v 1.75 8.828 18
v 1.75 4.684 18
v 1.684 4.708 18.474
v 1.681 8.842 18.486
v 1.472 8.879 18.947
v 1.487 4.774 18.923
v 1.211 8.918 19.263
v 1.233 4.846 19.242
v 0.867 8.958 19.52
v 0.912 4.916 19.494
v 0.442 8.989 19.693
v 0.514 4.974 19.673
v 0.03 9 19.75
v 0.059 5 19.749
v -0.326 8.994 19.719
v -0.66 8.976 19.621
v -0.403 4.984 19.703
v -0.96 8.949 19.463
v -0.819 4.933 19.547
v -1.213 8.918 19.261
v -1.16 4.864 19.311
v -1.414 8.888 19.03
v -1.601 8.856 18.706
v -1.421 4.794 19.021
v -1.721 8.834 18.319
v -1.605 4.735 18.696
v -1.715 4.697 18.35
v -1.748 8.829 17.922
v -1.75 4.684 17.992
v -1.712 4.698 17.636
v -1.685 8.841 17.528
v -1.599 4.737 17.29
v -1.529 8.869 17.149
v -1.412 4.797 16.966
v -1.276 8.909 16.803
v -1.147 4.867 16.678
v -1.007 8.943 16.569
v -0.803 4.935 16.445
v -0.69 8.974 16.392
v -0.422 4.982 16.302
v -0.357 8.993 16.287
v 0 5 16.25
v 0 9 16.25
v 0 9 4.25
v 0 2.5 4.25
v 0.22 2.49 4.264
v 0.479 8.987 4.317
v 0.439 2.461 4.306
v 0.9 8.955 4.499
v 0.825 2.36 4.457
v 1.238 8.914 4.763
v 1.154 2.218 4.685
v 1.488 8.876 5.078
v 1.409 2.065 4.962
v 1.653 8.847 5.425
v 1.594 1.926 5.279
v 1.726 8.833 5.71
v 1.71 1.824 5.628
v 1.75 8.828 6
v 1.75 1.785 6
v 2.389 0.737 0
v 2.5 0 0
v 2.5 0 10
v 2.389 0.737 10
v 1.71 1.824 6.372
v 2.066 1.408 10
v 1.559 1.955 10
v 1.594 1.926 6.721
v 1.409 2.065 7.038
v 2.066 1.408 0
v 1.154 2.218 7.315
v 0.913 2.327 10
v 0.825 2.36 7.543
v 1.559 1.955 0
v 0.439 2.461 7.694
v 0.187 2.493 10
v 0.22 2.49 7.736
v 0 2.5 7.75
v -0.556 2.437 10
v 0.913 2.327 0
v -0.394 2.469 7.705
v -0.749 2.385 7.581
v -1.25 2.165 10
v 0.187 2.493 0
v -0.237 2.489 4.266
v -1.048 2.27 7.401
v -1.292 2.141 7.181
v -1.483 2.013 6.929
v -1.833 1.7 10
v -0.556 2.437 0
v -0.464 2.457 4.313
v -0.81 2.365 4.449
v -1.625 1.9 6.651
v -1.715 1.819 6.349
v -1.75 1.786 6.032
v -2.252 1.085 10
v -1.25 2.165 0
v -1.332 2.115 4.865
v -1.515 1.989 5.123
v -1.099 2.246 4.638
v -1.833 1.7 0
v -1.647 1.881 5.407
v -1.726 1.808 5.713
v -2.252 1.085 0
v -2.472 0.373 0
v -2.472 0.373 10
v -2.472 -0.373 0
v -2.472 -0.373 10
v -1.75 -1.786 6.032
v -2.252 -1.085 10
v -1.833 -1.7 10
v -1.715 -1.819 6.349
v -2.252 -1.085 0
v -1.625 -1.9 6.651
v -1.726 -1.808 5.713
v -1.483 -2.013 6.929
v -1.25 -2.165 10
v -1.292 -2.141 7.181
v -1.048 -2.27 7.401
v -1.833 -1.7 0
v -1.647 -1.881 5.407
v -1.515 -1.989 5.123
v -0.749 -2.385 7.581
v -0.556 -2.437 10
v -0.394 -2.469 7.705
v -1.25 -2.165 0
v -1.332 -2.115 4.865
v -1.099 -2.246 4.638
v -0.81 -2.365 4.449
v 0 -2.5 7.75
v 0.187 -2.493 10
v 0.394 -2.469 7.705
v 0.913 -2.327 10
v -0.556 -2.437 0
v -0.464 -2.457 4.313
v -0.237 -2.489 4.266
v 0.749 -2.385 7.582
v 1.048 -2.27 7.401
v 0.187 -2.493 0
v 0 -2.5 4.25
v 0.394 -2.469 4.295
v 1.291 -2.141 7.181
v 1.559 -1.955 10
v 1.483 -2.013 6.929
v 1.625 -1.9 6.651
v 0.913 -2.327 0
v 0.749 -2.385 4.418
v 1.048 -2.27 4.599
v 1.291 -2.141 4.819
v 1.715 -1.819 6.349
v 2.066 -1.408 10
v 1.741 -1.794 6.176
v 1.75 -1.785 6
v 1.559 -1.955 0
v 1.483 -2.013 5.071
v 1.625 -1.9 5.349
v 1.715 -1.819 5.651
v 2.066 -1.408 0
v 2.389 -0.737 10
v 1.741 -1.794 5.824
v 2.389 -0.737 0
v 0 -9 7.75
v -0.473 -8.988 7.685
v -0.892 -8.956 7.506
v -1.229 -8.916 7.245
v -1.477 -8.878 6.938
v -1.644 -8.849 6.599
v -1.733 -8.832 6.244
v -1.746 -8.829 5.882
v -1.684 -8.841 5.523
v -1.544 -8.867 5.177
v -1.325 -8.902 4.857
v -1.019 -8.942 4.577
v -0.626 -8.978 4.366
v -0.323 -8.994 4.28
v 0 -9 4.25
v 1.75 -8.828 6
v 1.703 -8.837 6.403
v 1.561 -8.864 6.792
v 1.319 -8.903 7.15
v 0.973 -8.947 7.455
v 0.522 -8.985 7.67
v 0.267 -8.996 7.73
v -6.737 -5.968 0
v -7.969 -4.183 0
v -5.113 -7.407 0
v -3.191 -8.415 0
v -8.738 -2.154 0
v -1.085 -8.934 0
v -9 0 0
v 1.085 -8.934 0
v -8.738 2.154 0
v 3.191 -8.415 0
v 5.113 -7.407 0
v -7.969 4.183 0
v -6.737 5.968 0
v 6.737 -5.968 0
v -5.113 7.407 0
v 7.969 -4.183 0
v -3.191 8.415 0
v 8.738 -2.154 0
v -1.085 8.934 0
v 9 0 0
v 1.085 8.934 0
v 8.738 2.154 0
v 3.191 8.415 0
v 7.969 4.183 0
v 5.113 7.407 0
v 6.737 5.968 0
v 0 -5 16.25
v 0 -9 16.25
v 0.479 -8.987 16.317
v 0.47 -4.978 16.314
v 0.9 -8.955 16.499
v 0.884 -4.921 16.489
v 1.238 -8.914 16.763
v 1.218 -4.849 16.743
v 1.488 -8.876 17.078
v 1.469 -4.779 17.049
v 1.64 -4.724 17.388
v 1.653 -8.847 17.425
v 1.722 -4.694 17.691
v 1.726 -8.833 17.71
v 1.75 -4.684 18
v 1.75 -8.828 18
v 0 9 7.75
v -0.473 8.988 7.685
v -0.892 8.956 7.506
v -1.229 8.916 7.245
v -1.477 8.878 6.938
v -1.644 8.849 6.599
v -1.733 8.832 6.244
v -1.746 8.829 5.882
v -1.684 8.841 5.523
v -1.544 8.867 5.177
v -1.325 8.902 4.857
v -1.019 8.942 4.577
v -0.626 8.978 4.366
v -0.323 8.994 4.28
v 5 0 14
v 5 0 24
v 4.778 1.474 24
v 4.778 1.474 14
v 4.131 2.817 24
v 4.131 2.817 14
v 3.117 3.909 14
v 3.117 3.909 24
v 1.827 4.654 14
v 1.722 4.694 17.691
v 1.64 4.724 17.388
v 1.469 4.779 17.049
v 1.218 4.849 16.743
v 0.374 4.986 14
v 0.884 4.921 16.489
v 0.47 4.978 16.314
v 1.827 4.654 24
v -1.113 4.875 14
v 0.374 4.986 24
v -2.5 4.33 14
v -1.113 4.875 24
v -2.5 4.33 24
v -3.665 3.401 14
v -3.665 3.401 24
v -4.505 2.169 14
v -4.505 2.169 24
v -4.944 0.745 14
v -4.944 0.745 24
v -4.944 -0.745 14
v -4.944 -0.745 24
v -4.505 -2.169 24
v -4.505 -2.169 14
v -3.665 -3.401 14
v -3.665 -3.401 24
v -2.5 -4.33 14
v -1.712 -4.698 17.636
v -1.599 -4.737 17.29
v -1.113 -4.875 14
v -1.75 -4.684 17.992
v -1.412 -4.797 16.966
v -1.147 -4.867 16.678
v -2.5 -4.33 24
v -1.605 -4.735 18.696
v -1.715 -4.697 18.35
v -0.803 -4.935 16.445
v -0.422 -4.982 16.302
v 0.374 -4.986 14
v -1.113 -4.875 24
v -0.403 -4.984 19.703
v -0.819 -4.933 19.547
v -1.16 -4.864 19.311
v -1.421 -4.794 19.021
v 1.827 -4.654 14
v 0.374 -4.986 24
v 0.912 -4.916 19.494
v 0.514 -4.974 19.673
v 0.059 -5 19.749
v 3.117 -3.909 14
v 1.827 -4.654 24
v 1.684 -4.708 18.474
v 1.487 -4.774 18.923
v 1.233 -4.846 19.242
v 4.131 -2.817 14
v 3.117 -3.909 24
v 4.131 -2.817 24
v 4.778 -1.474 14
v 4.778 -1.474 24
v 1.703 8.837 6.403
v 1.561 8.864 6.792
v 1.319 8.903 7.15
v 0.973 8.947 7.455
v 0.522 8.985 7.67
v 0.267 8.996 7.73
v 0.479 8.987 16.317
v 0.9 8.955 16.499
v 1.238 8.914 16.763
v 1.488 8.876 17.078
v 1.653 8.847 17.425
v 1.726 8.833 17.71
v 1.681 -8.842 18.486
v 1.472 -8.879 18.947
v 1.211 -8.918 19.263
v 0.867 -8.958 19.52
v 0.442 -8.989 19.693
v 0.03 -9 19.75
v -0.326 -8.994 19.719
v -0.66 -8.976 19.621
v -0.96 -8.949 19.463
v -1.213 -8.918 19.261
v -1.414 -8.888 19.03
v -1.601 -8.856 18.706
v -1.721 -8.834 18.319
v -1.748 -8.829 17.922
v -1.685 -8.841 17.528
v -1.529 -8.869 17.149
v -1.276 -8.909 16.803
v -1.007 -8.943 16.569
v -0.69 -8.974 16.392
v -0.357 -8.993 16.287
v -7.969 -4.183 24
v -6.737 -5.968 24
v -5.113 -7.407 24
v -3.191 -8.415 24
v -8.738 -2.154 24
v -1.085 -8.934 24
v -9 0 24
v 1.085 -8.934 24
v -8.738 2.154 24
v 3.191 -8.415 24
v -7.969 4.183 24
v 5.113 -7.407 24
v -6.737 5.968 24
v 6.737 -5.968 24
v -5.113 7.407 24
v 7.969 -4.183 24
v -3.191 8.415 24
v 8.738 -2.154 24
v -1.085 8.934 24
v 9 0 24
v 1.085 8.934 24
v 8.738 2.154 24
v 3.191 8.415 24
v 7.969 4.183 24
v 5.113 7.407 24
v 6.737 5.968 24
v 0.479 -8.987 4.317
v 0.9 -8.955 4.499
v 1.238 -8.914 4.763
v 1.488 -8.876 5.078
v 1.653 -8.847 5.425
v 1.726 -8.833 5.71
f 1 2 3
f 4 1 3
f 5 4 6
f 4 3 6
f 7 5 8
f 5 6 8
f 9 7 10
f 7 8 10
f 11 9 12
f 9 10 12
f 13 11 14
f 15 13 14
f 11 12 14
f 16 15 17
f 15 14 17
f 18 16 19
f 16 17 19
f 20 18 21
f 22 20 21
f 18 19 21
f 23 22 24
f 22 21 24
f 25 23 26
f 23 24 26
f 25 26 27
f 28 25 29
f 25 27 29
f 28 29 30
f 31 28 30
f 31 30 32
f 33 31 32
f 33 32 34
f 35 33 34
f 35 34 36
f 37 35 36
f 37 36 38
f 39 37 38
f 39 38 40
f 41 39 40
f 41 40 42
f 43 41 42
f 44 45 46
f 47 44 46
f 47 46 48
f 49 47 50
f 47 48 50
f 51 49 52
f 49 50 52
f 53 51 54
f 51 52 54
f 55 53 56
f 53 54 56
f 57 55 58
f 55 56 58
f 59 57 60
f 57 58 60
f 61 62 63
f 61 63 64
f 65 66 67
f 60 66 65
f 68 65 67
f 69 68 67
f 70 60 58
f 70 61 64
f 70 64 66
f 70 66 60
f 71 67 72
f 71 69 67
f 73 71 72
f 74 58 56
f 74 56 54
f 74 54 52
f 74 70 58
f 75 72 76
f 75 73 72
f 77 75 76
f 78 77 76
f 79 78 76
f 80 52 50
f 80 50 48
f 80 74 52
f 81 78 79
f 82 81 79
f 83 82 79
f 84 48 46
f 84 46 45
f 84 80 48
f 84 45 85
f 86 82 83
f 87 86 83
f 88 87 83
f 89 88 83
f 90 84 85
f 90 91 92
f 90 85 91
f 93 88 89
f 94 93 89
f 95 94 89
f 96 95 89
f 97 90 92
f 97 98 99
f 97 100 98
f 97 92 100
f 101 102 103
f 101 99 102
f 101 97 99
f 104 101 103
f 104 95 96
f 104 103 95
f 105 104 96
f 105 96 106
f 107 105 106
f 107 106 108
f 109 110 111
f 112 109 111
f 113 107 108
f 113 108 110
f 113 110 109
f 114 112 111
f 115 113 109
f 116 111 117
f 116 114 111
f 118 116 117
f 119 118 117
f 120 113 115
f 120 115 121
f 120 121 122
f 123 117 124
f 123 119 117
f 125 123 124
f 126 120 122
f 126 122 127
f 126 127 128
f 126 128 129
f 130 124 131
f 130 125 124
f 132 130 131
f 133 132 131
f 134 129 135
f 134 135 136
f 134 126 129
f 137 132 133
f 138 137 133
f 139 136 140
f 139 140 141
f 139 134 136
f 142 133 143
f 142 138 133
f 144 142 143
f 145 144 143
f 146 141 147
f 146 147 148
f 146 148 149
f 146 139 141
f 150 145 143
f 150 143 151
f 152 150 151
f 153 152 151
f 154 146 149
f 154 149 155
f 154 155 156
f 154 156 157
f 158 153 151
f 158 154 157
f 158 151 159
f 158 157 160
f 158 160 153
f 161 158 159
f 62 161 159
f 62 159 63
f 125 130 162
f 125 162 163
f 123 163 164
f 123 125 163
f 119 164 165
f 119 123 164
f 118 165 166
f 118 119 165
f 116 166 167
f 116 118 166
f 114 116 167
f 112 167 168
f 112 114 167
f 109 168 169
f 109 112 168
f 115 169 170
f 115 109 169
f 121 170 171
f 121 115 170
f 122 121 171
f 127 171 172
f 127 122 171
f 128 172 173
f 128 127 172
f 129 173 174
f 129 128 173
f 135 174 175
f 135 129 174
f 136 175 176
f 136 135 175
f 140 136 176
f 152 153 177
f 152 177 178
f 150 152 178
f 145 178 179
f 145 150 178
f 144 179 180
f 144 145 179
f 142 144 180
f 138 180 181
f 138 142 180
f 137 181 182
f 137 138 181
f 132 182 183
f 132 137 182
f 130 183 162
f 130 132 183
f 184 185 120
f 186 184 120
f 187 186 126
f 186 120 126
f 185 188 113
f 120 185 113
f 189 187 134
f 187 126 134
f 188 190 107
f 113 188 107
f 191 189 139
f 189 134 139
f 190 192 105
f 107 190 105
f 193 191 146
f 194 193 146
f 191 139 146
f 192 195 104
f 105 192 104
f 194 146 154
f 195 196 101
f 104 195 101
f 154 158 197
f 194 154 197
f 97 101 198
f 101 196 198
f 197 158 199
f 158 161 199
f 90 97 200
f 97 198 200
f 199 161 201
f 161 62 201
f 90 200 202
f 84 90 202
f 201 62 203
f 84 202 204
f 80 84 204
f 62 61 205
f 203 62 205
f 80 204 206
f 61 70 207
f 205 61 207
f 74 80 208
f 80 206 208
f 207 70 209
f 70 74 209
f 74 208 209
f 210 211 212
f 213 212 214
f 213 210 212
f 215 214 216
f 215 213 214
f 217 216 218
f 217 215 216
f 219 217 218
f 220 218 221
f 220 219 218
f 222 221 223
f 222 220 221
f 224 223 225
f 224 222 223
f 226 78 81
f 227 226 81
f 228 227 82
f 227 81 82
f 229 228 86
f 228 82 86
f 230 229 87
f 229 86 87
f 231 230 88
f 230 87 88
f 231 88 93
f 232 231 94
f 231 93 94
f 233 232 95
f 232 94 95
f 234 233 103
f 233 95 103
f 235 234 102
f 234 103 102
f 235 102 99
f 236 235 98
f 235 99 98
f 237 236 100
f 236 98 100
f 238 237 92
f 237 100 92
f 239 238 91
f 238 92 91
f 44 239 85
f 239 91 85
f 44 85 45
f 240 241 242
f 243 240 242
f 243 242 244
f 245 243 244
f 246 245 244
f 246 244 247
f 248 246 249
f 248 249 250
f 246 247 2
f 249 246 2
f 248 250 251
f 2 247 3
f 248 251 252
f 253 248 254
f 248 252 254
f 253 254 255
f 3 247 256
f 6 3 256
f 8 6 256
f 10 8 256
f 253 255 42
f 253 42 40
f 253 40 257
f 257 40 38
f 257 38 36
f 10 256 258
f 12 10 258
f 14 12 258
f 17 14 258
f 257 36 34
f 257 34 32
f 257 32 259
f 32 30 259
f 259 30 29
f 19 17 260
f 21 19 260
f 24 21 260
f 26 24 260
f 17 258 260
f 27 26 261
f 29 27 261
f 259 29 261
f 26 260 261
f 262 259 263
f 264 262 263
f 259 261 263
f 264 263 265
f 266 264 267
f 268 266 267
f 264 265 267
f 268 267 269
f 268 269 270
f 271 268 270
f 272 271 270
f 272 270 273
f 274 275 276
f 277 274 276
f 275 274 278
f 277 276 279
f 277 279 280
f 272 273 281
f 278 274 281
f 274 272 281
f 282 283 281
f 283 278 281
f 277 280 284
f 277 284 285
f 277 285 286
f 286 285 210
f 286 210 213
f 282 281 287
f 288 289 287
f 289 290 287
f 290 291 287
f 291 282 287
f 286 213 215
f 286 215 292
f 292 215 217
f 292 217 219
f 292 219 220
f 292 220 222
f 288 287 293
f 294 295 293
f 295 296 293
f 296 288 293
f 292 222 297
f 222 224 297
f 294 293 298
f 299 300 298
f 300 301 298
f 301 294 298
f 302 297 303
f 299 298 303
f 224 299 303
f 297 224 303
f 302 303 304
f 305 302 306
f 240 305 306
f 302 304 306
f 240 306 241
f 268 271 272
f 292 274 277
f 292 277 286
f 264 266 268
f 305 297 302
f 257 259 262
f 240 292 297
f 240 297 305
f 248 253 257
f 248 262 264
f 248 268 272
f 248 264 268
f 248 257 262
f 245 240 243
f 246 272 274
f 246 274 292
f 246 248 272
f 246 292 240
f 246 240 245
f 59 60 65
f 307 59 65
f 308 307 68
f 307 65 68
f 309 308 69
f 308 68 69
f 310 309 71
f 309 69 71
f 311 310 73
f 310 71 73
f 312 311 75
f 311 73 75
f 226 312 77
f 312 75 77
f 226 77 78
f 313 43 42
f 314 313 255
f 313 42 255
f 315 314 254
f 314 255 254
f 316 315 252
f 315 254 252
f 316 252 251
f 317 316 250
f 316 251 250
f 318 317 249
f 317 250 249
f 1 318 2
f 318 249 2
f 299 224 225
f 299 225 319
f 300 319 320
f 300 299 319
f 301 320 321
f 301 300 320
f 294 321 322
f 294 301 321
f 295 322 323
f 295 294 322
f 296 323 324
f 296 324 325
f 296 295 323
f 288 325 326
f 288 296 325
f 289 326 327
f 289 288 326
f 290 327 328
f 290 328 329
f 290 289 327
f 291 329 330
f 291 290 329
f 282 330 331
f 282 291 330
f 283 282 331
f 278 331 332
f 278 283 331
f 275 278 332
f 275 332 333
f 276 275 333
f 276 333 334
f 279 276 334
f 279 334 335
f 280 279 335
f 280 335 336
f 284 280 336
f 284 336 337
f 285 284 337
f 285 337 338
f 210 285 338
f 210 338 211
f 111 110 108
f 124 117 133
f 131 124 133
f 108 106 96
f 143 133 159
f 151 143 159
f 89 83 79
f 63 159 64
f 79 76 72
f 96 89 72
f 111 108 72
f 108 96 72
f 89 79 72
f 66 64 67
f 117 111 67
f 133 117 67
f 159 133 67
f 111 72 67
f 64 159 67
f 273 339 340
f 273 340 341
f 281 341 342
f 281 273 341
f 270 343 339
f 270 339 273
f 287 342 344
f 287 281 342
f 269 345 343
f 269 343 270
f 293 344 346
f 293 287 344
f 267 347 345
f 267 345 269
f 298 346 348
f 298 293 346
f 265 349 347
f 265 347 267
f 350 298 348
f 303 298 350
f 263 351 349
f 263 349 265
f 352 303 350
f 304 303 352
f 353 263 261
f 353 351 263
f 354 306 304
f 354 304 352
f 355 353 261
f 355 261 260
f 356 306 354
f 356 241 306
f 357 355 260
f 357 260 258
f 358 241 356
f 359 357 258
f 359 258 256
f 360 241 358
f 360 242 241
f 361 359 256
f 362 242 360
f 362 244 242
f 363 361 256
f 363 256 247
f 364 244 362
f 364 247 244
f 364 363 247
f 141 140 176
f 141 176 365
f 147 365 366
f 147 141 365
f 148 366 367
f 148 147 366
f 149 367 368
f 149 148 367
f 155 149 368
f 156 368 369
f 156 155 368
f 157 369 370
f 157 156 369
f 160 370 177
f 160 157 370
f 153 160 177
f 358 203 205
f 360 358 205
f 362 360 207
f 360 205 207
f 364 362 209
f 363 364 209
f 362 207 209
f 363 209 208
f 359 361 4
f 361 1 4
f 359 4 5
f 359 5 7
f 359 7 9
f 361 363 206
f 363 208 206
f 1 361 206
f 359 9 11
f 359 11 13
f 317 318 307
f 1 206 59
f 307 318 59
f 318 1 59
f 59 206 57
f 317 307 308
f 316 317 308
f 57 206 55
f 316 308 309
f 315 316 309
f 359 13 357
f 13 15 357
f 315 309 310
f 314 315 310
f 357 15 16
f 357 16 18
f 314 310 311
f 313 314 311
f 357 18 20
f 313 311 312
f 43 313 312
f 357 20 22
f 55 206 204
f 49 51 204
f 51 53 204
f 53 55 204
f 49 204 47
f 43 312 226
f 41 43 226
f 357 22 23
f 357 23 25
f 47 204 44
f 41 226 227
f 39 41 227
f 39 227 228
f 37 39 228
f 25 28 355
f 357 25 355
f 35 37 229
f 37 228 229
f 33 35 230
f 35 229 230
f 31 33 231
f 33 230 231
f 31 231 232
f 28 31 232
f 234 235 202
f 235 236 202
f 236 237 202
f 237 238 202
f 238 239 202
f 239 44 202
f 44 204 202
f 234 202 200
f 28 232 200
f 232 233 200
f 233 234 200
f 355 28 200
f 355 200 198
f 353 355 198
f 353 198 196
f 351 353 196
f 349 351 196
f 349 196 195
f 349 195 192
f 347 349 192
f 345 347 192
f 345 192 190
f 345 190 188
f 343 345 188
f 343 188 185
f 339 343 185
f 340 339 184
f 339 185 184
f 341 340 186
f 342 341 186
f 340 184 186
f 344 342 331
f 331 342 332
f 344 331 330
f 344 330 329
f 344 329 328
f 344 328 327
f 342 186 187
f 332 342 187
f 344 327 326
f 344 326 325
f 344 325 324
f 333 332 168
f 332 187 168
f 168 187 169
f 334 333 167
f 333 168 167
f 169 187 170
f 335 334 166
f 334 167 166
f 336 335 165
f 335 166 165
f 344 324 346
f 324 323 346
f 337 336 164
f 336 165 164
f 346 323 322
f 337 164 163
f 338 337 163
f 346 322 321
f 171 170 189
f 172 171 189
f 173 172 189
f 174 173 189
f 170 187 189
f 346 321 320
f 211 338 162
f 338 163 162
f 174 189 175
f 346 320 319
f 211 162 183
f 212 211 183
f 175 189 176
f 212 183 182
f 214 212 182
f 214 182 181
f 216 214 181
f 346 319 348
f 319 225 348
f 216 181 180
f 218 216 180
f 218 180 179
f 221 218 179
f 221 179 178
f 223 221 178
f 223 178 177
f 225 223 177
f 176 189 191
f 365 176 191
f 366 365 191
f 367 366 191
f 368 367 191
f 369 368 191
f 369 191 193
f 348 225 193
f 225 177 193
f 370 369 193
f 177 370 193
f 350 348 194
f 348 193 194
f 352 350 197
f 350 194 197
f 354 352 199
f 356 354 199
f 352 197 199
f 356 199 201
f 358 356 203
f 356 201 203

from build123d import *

# Parameters (mm, degrees)
F0_R          = 9
F1_DEPTH      = 24
F2_R          = 5
F3_DEPTH      = 10
F4_R          = 2.5
F5_DEPTH      = 10
F7_DEPTH      = 25
F7_DEPTH_BACK = 25


with BuildPart() as f1:
    # F0 (on Top) → F1 (new body)
    with BuildSketch(Plane.XY):
        Circle(F0_R)
    extrude(amount=F1_DEPTH)

    # F2 (on face) → F3 (cut)
    with BuildSketch(Plane.XY.offset(24)):
        Circle(F2_R)
    extrude(amount=-F3_DEPTH, mode=Mode.SUBTRACT)

    # F4 (on Top) → F5 (cut)
    with BuildSketch(Plane.XY):
        Circle(F4_R)
    extrude(amount=F5_DEPTH, mode=Mode.SUBTRACT)

    # F6 (on Front) → F7 (cut, two sides)
    with BuildSketch(Plane.XZ) as f7_sk:
        with BuildLine():
            ThreePointArc((0, 7.75), (-1.75, 6), (0, 4.25))
            Line((0, 4.25), (0, 6))
            Line((0, 6), (0, 7.75))
        make_face()
        with BuildLine():
            ThreePointArc((1.75, 18), (-1.2374368671, 19.2374368671), (0, 16.25))
            ThreePointArc((0, 16.25), (1.2374368671, 16.7625631329), (1.75, 18))
        make_face()
        with BuildLine():
            Line((0, 6), (0, 4.25))
            ThreePointArc((0, 4.25), (1.2374368671, 4.7625631329), (1.75, 6))
            ThreePointArc((1.75, 6), (1.2374368671, 7.2374368671), (0, 7.75))
            Line((0, 7.75), (0, 6))
        make_face()
    extrude(amount=-F7_DEPTH, mode=Mode.SUBTRACT)
    extrude(f7_sk.sketch, amount=F7_DEPTH_BACK, mode=Mode.SUBTRACT)


solid = f1.part
